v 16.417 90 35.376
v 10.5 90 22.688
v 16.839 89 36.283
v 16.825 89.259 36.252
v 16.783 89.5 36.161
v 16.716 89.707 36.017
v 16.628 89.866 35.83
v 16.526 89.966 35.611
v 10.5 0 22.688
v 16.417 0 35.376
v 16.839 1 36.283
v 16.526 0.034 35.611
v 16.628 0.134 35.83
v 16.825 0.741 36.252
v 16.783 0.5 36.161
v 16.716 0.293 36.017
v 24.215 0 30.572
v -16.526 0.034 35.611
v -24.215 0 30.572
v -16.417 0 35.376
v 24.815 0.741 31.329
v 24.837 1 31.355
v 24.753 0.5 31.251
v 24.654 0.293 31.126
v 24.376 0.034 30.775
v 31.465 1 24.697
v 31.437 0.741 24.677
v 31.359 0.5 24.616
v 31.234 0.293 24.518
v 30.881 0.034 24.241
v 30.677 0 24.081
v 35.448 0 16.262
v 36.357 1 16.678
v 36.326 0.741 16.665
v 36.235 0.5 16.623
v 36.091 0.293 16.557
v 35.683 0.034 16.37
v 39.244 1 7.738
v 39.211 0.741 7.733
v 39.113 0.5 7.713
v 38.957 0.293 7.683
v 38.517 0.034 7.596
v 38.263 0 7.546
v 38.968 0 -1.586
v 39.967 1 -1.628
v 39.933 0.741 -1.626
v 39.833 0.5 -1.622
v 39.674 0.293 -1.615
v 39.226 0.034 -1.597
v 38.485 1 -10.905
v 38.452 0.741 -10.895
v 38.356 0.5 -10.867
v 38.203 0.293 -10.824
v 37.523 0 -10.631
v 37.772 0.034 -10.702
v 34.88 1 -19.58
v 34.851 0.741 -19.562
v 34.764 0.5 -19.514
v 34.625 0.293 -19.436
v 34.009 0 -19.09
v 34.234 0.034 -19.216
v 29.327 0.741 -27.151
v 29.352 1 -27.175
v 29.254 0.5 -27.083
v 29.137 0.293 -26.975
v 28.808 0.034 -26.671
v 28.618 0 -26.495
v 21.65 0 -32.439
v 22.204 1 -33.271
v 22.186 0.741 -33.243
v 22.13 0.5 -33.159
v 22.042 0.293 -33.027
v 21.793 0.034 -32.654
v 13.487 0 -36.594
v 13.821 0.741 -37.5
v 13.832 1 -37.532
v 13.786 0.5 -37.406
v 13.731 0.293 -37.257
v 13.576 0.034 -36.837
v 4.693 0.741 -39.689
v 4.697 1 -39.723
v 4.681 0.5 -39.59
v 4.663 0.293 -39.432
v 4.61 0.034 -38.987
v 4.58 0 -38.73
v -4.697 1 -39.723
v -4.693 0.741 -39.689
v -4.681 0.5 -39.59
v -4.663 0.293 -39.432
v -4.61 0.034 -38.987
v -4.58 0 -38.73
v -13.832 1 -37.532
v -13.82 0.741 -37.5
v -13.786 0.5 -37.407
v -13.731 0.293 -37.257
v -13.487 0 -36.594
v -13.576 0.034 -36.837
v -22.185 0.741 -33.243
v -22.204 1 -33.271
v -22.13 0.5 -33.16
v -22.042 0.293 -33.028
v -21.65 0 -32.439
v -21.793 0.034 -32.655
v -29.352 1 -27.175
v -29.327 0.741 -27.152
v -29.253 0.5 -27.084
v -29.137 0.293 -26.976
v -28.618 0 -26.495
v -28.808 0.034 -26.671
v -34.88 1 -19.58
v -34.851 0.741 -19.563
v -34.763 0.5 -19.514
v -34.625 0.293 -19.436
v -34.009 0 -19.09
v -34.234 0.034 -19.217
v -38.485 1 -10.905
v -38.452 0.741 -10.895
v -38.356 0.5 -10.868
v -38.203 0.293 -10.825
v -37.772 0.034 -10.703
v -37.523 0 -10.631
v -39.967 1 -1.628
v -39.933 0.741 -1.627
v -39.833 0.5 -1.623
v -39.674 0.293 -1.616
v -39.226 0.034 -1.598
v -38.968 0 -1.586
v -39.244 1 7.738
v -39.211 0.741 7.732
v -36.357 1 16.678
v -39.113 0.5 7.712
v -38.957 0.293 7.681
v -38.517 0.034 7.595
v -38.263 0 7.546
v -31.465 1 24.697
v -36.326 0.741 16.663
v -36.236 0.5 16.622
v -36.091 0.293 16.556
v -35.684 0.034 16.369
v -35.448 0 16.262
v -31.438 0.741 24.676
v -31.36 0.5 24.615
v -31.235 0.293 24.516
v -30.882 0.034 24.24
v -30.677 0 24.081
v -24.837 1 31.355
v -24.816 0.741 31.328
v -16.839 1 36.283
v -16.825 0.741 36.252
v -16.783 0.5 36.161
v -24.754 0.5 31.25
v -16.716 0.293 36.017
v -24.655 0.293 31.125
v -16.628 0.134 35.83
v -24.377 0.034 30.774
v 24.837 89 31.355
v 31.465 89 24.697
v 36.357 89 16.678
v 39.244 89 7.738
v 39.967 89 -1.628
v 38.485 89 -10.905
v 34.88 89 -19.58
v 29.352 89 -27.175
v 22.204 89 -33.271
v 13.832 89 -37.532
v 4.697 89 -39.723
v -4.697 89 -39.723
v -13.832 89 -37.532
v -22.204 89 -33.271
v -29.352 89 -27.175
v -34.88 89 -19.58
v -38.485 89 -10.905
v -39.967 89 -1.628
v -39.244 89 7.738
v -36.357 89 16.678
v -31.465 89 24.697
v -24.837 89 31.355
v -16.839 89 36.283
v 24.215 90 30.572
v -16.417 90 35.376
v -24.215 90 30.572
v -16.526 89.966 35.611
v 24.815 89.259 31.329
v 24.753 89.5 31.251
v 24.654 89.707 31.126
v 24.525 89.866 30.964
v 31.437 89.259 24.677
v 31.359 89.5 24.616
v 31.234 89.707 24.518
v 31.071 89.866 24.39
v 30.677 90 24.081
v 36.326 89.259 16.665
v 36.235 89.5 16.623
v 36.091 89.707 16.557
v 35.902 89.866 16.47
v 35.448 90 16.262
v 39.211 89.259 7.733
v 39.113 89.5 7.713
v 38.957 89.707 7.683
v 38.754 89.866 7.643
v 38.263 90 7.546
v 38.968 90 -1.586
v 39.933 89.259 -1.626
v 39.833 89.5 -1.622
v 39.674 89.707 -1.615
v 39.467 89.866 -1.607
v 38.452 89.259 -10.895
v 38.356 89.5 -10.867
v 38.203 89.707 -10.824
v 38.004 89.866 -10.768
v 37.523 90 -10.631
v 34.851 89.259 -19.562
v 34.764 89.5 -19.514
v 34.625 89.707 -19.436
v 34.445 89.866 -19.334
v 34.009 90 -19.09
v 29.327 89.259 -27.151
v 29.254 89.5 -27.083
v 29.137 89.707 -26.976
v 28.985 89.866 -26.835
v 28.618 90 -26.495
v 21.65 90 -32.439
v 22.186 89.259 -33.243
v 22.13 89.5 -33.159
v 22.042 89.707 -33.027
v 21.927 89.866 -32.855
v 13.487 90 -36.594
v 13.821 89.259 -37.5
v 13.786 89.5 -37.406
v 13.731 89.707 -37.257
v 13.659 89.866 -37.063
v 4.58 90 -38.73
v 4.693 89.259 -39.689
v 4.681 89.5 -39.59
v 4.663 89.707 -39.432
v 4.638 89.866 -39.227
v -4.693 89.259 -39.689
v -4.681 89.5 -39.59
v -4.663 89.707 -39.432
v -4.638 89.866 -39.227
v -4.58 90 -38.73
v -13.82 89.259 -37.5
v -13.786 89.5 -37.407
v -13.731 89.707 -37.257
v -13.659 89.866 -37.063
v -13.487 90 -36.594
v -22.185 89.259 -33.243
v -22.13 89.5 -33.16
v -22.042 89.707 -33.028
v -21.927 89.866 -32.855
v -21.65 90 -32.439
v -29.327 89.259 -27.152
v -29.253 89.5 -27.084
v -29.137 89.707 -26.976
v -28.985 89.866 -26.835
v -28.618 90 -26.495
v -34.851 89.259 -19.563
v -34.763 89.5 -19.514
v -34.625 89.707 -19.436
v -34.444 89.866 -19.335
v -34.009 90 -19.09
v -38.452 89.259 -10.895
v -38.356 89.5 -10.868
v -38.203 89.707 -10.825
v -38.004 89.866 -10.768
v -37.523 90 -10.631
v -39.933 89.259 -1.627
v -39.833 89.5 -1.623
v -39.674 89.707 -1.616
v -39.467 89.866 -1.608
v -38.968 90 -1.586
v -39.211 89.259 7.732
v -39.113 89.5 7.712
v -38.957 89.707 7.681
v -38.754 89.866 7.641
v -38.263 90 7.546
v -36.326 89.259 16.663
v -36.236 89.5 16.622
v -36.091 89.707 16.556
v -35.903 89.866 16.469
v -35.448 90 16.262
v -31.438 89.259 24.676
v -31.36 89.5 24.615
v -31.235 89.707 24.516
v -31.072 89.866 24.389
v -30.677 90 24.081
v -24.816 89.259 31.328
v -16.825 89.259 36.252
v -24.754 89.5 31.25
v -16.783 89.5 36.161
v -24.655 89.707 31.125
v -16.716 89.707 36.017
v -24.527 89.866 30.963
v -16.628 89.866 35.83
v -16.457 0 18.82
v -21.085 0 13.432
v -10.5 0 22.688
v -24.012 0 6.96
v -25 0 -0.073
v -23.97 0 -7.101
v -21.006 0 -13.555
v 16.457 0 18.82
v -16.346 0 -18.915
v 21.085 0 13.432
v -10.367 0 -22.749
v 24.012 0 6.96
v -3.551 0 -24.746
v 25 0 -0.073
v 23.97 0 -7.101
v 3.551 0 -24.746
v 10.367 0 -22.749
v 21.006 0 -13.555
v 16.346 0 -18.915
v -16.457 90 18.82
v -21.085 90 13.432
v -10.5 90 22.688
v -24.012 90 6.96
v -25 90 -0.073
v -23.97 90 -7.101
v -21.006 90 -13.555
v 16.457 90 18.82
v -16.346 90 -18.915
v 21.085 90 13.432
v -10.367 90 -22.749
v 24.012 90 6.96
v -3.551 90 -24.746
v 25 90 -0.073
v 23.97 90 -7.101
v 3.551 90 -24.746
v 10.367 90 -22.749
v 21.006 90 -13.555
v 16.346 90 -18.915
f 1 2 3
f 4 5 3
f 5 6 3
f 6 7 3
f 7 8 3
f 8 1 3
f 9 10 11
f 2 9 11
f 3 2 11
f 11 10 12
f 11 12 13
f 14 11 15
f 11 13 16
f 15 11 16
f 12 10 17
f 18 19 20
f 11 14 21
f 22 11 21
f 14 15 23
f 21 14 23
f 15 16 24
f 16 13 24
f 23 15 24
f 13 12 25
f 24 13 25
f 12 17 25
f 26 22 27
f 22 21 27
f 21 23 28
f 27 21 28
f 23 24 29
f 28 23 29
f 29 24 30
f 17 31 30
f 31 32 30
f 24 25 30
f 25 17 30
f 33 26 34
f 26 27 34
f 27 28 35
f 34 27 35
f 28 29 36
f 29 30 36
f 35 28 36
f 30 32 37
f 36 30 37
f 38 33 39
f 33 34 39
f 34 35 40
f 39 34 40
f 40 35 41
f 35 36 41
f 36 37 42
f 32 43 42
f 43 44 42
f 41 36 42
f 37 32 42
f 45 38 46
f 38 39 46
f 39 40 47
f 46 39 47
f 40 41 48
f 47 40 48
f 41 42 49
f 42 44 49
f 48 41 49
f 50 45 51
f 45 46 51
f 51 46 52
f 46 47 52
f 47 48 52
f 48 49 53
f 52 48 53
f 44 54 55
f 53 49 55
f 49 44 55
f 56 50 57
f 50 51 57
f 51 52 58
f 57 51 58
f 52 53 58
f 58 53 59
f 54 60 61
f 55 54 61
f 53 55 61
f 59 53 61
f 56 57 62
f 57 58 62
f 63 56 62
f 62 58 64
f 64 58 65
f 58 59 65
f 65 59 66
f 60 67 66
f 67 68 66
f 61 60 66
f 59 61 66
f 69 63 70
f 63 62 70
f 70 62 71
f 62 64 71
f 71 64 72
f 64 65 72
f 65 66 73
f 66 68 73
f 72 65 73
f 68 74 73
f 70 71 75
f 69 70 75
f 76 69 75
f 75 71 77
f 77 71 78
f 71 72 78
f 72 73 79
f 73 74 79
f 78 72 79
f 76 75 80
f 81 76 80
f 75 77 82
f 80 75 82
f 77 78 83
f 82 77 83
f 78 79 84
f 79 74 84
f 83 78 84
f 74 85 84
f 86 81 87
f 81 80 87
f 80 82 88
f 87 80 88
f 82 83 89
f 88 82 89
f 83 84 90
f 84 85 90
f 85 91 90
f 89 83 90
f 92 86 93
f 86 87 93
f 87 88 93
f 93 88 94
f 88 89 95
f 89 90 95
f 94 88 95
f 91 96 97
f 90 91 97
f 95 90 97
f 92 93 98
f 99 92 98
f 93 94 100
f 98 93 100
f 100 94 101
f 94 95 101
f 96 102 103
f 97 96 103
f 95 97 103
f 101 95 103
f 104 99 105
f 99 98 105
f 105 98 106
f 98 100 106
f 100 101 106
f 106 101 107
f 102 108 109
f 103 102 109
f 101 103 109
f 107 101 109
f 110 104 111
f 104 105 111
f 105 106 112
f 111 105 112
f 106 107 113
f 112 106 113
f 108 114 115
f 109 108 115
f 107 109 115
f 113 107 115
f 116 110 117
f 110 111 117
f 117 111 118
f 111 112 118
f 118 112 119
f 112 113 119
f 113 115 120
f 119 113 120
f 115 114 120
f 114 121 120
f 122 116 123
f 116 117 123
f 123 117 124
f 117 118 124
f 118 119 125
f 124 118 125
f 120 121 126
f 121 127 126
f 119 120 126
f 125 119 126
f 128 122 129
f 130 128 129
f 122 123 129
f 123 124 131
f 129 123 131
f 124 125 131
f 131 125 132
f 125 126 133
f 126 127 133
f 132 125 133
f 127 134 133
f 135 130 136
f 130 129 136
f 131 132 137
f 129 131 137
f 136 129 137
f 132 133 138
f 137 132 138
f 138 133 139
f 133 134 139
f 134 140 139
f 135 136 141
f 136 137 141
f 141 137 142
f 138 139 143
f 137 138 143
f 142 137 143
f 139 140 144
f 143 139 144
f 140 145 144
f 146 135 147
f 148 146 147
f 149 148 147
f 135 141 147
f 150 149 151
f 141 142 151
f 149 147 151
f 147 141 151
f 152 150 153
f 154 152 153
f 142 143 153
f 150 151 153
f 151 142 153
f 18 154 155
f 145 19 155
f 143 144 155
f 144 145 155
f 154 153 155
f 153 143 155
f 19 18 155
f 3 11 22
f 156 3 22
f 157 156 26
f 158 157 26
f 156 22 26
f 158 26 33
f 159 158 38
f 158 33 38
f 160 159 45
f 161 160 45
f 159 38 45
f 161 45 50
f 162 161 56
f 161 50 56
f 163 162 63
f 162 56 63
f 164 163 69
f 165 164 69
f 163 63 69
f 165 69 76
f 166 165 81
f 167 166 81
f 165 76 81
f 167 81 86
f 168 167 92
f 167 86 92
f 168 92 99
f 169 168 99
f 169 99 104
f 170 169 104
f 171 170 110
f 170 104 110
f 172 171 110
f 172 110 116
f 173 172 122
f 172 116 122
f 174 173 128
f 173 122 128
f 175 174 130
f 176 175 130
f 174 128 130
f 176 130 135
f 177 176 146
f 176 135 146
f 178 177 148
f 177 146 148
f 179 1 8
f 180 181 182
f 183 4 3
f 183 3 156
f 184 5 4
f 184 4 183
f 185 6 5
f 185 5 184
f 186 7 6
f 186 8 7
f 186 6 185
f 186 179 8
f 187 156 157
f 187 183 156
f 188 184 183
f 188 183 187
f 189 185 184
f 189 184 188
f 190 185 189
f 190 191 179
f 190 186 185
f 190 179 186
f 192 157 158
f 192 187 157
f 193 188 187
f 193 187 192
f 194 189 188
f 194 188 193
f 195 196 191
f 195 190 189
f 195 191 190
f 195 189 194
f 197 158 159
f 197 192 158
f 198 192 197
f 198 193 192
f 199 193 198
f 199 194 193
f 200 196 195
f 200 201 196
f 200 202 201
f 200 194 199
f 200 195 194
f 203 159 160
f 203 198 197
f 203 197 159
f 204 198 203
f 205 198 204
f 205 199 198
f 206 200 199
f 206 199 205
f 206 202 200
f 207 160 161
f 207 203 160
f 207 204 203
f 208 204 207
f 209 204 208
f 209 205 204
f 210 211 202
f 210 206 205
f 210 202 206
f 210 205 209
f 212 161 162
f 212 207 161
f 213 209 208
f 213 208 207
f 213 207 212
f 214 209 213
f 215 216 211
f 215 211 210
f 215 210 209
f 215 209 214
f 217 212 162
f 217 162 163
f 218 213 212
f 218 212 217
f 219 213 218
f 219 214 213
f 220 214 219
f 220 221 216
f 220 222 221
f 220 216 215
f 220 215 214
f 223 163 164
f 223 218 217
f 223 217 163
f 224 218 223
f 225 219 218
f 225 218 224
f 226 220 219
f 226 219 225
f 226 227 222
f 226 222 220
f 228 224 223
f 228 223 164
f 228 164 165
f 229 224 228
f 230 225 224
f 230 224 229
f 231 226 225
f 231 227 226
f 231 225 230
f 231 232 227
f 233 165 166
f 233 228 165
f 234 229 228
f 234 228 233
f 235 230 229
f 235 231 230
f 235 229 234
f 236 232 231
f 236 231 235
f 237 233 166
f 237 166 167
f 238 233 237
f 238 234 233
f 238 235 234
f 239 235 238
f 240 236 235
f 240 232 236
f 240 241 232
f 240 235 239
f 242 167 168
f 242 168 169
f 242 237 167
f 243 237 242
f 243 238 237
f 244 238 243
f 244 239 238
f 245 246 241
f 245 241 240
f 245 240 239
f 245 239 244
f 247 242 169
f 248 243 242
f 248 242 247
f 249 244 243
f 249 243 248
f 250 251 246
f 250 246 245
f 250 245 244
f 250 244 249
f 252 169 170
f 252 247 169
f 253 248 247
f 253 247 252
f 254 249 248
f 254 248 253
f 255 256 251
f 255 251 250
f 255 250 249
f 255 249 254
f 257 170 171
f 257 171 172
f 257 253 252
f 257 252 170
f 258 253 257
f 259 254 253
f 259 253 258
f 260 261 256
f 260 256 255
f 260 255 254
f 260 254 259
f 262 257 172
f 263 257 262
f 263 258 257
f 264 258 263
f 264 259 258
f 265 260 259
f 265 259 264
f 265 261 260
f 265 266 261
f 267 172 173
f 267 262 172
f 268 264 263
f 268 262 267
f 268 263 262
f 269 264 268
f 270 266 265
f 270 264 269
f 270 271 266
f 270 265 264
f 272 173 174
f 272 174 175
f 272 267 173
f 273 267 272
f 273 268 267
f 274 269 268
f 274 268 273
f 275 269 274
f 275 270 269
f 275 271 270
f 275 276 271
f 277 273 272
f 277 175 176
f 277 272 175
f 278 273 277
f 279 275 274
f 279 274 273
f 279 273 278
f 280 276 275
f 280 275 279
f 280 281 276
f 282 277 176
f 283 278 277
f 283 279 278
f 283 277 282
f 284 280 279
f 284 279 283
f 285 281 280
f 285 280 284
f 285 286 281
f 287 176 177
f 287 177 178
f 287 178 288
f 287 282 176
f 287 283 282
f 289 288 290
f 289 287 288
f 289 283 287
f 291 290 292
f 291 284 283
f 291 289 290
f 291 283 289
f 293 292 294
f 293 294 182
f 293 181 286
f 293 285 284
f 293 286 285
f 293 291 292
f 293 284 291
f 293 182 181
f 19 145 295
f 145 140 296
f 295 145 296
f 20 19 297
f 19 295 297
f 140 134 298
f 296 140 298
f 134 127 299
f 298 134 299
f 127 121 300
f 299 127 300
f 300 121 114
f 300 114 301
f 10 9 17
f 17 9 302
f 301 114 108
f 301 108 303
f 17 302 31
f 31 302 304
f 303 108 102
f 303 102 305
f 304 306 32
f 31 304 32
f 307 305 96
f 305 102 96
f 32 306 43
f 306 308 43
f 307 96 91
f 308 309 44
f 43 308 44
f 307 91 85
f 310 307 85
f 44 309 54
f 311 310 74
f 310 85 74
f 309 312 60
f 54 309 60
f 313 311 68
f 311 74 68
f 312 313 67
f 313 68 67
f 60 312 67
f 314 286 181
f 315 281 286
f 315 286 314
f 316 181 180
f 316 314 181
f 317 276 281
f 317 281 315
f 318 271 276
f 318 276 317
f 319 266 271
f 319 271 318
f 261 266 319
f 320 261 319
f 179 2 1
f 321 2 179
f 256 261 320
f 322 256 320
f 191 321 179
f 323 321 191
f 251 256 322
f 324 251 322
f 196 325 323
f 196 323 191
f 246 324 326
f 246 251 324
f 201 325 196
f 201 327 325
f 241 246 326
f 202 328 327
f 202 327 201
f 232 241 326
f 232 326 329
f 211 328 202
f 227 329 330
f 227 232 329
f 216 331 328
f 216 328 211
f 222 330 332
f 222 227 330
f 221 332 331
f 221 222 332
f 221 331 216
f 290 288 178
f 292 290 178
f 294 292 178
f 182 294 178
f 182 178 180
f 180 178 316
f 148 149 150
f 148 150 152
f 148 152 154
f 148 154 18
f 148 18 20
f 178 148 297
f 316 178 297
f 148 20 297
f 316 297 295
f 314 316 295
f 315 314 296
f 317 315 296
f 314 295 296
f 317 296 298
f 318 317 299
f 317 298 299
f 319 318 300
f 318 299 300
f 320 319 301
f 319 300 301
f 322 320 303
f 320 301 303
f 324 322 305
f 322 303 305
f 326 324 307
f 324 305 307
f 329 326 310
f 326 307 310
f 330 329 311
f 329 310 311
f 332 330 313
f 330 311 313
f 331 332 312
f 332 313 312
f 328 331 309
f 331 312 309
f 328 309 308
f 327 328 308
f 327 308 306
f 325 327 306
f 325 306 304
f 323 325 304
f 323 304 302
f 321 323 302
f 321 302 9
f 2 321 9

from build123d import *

# Parameters (mm, degrees)
BOSS_EXTRUDE1_DEPTH = 90
FILLET1_R           = 1


with BuildPart() as part:
    # Sketch1 → Boss-Extrude1 (new body)
    with BuildSketch(Plane(origin=(0, 0, 0), x_dir=(1, 0, 0), z_dir=(0, 1, 0))):
        with BuildLine():
            Line((-16.839290437, -36.282754823), (-10.5, -22.688102609))
            ThreePointArc((-10.5, -22.688102609), (0, 25), (10.5, -22.688102609))
            Line((10.5, -22.688102609), (16.839290437, -36.282754823))
            ThreePointArc((16.839290437, -36.282754823), (0, 40), (-16.839290437, -36.282754823))
        make_face()
    extrude(amount=BOSS_EXTRUDE1_DEPTH)

    # Fillet1
    fillet1_edges = [part.edges().sort_by_distance(p)[0] for p in [
        (0, 90, -40),
        (0, 0, -40),
    ]]
    fillet(fillet1_edges, radius=FILLET1_R)


solid = part.part
